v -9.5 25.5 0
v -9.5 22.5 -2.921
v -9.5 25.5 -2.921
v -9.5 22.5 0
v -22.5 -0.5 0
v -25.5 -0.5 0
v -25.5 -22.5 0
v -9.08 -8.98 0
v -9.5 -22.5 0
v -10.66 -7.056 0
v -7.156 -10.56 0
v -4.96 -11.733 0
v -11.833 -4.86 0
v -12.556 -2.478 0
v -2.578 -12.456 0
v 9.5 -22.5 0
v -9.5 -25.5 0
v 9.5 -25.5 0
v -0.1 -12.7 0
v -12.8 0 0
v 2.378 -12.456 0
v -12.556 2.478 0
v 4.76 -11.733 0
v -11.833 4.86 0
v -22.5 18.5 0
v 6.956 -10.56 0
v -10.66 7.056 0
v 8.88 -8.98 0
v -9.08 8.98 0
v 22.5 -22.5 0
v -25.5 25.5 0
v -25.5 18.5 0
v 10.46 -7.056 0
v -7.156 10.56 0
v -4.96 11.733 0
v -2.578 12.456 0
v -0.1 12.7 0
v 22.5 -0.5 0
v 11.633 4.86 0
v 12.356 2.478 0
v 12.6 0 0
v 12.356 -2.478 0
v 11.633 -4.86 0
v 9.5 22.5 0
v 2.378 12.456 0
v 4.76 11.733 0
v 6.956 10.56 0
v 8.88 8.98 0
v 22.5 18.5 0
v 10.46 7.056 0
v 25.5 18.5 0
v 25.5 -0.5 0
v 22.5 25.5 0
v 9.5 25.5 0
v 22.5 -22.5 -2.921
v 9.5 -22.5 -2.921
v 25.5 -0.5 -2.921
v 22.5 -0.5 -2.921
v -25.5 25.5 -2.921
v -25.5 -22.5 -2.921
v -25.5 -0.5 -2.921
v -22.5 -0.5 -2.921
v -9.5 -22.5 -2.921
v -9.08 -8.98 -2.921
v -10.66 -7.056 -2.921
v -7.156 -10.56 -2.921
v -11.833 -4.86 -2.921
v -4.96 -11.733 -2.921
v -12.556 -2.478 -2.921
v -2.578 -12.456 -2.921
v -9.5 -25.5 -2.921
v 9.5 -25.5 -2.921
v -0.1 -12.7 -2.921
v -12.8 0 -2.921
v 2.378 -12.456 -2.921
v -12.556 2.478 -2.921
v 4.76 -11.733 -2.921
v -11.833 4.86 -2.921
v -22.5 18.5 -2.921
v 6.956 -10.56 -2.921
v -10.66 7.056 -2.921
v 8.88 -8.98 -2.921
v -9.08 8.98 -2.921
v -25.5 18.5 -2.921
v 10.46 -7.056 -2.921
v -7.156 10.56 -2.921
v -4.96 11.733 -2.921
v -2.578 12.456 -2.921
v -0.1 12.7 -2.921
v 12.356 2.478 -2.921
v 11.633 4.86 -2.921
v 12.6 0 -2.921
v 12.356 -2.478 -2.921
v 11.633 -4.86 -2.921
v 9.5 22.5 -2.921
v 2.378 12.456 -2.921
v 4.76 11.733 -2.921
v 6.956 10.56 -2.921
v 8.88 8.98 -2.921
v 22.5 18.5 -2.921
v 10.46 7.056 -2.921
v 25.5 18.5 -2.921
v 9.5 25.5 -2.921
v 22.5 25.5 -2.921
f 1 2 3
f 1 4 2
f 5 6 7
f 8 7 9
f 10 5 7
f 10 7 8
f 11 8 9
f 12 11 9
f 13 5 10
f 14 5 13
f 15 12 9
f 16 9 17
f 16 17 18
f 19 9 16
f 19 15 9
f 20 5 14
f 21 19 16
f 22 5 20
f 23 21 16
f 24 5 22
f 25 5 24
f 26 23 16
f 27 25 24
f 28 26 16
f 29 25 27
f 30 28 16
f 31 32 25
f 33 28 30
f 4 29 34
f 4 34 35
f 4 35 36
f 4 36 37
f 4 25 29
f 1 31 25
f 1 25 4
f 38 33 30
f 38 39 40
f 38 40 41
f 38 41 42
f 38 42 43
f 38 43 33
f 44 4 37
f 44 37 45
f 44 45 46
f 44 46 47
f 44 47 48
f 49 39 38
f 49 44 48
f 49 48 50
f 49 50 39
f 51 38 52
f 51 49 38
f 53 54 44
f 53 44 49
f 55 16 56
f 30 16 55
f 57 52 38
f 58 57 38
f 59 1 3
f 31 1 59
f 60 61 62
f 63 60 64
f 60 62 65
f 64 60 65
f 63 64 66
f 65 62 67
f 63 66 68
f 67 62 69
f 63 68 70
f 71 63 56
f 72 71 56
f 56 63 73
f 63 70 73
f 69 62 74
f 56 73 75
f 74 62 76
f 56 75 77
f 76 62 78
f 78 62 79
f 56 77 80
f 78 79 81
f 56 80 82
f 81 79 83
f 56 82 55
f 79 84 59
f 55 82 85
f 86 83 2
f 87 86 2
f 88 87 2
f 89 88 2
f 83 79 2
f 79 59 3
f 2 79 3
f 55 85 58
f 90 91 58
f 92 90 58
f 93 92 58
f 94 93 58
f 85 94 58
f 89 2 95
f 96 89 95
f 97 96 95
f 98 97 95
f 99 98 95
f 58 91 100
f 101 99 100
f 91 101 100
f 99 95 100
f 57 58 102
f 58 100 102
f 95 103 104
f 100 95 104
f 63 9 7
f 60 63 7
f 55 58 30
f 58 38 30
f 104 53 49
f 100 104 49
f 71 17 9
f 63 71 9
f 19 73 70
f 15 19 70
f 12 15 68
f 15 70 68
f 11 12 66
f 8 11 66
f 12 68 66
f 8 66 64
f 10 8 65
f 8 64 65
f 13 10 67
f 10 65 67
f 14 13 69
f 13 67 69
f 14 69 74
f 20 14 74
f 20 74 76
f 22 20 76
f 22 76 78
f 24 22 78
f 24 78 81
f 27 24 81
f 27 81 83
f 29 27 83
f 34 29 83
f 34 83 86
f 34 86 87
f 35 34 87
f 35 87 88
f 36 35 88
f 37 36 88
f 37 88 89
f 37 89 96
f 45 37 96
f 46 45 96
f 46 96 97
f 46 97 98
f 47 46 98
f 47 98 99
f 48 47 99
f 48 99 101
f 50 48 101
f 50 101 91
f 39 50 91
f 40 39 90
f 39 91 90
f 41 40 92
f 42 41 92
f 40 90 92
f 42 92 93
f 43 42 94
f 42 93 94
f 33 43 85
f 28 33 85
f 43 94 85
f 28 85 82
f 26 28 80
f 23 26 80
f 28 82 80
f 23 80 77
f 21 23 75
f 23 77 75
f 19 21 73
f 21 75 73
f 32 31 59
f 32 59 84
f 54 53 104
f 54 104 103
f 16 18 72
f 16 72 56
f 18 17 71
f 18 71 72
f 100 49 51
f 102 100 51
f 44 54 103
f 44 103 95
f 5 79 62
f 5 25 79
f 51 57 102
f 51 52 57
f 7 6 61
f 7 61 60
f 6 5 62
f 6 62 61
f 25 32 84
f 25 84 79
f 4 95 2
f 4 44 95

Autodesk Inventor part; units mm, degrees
ref_plane "YZ Plane" through (0, 0, 0) normal (1, 0, 0) x (0, 1, 0)
ref_plane "XZ Plane" through (0, 0, 0) normal (0, 1, 0) x (-1, 0, 0)
ref_plane "XY Plane" through (0, 0, 0) normal (0, 0, 1) x (1, 0, 0)
sketch "Sketch1" plane through (0, 0, 0) normal (0, 0, 1) x (1, 0, 0)
  line L0 (-25.5, -25.5) -> (25.5, -25.5)
  line L1 (25.5, -25.5) -> (25.5, 25.5)
  line L2 (25.5, 25.5) -> (-25.5, 25.5)
  line L3 (-25.5, 25.5) -> (-25.5, -25.5)
  line L4 (-25.5, -25.5) -> (25.5, 25.5) construction
  line L5 (25.5, -25.5) -> (-25.5, 25.5) construction
  point P0 (0, 0)
  dimension "d0" = 51
  dimension "d1" = 51
extrude "Extrusion1" add sketch "Sketch1" against normal blind 2.921
sketch "Sketch4" plane through (0, 0, 0) normal (0, 0, 1) x (1, 0, 0)
  line L0 (-25.5, -25.5) -> (-9.5, -25.5)
  line L1 (-9.5, -25.5) -> (-9.5, -22.5)
  line L2 (-9.5, -22.5) -> (-25.5, -22.5)
  line L3 (-25.5, -22.5) -> (-25.5, -25.5)
  line L4 (25.5, 25.5) -> (-25.5, 25.5) projected
  line L5 (-25.5, 25.5) -> (-25.5, -25.5) projected
  line L6 (-25.5, 18.5) -> (-22.5, 18.5)
  line L7 (-22.5, 18.5) -> (-22.5, -0.5)
  line L8 (-22.5, -0.5) -> (-25.5, -0.5)
  line L9 (-25.5, -0.5) -> (-25.5, 18.5)
  line L10 (25.5, -0.5) -> (25.5, 18.5)
  line L11 (-9.5, 25.5) -> (9.5, 25.5)
  line L12 (9.5, 25.5) -> (9.5, 22.5)
  line L13 (9.5, 22.5) -> (-9.5, 22.5)
  line L14 (-9.5, 22.5) -> (-9.5, 25.5)
  line L15 (-25.5, -25.5) -> (25.5, -25.5) projected
  line L16 (25.5, -25.5) -> (25.5, 25.5) projected
  line L17 (25.5, -0.5) -> (22.5, -0.5)
  line L18 (22.5, -0.5) -> (22.5, -22.5)
  line L19 (22.5, -25.5) -> (25.5, -25.5)
  line L20 (25.5, -25.5) -> (25.5, -0.5)
  line L21 (25.5, -25.5) -> (9.5, -25.5)
  line L22 (9.5, -25.5) -> (9.5, -22.5)
  line L23 (9.5, -22.5) -> (22.5, -22.5)
  line L24 (25.5, -22.5) -> (25.5, -25.5)
  line L25 (25.5, 25.5) -> (22.5, 25.5)
  line L26 (22.5, 25.5) -> (22.5, 18.5)
  line L27 (22.5, 18.5) -> (25.5, 18.5)
  line L28 (25.5, 18.5) -> (25.5, 25.5)
  point P0 (0, 0)
  dimension "d16" = 3
  dimension "d37" = 9.5
  dimension "d38" = 16
  dimension "d40" = 3
  dimension "d42" = 19
  dimension "d44" = 3
  dimension "d45" = 19
  dimension "d46" = 16
  dimension "d50" = 25
  dimension "d62" = 3
  dimension "d63" = 25
  dimension "d64" = 3
  dimension "d65" = 19
  dimension "d66" = 16
  dimension "d67" = 3
  dimension "d68" = 7
  dimension "d71" = 19
  dimension "d72" = 7
hole "Hole1" at (-0.1, 0, 0) direction (0, 0, -1) diameter 25.4 end through all
extrude "Extrusion6" cut sketch "Sketch4" against normal up to next contours L3 L2 L1 L0 | L22 L23 L18 L17 L16 L15 | L5 L6 L7 L8 | L4 L12 L13 L14 | L27 L26 L4 L16
equation "\"d1\" = d0"
equation "\"d16\" = d44"
equation "\"d37\" = 0.5 * d45"
equation "\"d38\" = -d37 + 0.5 * d0"
equation "\"d40\" = d44"
equation "\"d42\" = d45"
equation "\"d46\" = -0.5 * d45 + 0.5 * d52"
equation "\"d62\" = d44"
equation "\"d63\" = d50"
equation "\"d64\" = d44"
equation "\"d65\" = d45"
equation "\"d67\" = d44"
equation "\"d71\" = d42"
equation "\"d48\" = 0.5 * d0"
equation "\"d52\" = 51"
properties part number "Side B"
